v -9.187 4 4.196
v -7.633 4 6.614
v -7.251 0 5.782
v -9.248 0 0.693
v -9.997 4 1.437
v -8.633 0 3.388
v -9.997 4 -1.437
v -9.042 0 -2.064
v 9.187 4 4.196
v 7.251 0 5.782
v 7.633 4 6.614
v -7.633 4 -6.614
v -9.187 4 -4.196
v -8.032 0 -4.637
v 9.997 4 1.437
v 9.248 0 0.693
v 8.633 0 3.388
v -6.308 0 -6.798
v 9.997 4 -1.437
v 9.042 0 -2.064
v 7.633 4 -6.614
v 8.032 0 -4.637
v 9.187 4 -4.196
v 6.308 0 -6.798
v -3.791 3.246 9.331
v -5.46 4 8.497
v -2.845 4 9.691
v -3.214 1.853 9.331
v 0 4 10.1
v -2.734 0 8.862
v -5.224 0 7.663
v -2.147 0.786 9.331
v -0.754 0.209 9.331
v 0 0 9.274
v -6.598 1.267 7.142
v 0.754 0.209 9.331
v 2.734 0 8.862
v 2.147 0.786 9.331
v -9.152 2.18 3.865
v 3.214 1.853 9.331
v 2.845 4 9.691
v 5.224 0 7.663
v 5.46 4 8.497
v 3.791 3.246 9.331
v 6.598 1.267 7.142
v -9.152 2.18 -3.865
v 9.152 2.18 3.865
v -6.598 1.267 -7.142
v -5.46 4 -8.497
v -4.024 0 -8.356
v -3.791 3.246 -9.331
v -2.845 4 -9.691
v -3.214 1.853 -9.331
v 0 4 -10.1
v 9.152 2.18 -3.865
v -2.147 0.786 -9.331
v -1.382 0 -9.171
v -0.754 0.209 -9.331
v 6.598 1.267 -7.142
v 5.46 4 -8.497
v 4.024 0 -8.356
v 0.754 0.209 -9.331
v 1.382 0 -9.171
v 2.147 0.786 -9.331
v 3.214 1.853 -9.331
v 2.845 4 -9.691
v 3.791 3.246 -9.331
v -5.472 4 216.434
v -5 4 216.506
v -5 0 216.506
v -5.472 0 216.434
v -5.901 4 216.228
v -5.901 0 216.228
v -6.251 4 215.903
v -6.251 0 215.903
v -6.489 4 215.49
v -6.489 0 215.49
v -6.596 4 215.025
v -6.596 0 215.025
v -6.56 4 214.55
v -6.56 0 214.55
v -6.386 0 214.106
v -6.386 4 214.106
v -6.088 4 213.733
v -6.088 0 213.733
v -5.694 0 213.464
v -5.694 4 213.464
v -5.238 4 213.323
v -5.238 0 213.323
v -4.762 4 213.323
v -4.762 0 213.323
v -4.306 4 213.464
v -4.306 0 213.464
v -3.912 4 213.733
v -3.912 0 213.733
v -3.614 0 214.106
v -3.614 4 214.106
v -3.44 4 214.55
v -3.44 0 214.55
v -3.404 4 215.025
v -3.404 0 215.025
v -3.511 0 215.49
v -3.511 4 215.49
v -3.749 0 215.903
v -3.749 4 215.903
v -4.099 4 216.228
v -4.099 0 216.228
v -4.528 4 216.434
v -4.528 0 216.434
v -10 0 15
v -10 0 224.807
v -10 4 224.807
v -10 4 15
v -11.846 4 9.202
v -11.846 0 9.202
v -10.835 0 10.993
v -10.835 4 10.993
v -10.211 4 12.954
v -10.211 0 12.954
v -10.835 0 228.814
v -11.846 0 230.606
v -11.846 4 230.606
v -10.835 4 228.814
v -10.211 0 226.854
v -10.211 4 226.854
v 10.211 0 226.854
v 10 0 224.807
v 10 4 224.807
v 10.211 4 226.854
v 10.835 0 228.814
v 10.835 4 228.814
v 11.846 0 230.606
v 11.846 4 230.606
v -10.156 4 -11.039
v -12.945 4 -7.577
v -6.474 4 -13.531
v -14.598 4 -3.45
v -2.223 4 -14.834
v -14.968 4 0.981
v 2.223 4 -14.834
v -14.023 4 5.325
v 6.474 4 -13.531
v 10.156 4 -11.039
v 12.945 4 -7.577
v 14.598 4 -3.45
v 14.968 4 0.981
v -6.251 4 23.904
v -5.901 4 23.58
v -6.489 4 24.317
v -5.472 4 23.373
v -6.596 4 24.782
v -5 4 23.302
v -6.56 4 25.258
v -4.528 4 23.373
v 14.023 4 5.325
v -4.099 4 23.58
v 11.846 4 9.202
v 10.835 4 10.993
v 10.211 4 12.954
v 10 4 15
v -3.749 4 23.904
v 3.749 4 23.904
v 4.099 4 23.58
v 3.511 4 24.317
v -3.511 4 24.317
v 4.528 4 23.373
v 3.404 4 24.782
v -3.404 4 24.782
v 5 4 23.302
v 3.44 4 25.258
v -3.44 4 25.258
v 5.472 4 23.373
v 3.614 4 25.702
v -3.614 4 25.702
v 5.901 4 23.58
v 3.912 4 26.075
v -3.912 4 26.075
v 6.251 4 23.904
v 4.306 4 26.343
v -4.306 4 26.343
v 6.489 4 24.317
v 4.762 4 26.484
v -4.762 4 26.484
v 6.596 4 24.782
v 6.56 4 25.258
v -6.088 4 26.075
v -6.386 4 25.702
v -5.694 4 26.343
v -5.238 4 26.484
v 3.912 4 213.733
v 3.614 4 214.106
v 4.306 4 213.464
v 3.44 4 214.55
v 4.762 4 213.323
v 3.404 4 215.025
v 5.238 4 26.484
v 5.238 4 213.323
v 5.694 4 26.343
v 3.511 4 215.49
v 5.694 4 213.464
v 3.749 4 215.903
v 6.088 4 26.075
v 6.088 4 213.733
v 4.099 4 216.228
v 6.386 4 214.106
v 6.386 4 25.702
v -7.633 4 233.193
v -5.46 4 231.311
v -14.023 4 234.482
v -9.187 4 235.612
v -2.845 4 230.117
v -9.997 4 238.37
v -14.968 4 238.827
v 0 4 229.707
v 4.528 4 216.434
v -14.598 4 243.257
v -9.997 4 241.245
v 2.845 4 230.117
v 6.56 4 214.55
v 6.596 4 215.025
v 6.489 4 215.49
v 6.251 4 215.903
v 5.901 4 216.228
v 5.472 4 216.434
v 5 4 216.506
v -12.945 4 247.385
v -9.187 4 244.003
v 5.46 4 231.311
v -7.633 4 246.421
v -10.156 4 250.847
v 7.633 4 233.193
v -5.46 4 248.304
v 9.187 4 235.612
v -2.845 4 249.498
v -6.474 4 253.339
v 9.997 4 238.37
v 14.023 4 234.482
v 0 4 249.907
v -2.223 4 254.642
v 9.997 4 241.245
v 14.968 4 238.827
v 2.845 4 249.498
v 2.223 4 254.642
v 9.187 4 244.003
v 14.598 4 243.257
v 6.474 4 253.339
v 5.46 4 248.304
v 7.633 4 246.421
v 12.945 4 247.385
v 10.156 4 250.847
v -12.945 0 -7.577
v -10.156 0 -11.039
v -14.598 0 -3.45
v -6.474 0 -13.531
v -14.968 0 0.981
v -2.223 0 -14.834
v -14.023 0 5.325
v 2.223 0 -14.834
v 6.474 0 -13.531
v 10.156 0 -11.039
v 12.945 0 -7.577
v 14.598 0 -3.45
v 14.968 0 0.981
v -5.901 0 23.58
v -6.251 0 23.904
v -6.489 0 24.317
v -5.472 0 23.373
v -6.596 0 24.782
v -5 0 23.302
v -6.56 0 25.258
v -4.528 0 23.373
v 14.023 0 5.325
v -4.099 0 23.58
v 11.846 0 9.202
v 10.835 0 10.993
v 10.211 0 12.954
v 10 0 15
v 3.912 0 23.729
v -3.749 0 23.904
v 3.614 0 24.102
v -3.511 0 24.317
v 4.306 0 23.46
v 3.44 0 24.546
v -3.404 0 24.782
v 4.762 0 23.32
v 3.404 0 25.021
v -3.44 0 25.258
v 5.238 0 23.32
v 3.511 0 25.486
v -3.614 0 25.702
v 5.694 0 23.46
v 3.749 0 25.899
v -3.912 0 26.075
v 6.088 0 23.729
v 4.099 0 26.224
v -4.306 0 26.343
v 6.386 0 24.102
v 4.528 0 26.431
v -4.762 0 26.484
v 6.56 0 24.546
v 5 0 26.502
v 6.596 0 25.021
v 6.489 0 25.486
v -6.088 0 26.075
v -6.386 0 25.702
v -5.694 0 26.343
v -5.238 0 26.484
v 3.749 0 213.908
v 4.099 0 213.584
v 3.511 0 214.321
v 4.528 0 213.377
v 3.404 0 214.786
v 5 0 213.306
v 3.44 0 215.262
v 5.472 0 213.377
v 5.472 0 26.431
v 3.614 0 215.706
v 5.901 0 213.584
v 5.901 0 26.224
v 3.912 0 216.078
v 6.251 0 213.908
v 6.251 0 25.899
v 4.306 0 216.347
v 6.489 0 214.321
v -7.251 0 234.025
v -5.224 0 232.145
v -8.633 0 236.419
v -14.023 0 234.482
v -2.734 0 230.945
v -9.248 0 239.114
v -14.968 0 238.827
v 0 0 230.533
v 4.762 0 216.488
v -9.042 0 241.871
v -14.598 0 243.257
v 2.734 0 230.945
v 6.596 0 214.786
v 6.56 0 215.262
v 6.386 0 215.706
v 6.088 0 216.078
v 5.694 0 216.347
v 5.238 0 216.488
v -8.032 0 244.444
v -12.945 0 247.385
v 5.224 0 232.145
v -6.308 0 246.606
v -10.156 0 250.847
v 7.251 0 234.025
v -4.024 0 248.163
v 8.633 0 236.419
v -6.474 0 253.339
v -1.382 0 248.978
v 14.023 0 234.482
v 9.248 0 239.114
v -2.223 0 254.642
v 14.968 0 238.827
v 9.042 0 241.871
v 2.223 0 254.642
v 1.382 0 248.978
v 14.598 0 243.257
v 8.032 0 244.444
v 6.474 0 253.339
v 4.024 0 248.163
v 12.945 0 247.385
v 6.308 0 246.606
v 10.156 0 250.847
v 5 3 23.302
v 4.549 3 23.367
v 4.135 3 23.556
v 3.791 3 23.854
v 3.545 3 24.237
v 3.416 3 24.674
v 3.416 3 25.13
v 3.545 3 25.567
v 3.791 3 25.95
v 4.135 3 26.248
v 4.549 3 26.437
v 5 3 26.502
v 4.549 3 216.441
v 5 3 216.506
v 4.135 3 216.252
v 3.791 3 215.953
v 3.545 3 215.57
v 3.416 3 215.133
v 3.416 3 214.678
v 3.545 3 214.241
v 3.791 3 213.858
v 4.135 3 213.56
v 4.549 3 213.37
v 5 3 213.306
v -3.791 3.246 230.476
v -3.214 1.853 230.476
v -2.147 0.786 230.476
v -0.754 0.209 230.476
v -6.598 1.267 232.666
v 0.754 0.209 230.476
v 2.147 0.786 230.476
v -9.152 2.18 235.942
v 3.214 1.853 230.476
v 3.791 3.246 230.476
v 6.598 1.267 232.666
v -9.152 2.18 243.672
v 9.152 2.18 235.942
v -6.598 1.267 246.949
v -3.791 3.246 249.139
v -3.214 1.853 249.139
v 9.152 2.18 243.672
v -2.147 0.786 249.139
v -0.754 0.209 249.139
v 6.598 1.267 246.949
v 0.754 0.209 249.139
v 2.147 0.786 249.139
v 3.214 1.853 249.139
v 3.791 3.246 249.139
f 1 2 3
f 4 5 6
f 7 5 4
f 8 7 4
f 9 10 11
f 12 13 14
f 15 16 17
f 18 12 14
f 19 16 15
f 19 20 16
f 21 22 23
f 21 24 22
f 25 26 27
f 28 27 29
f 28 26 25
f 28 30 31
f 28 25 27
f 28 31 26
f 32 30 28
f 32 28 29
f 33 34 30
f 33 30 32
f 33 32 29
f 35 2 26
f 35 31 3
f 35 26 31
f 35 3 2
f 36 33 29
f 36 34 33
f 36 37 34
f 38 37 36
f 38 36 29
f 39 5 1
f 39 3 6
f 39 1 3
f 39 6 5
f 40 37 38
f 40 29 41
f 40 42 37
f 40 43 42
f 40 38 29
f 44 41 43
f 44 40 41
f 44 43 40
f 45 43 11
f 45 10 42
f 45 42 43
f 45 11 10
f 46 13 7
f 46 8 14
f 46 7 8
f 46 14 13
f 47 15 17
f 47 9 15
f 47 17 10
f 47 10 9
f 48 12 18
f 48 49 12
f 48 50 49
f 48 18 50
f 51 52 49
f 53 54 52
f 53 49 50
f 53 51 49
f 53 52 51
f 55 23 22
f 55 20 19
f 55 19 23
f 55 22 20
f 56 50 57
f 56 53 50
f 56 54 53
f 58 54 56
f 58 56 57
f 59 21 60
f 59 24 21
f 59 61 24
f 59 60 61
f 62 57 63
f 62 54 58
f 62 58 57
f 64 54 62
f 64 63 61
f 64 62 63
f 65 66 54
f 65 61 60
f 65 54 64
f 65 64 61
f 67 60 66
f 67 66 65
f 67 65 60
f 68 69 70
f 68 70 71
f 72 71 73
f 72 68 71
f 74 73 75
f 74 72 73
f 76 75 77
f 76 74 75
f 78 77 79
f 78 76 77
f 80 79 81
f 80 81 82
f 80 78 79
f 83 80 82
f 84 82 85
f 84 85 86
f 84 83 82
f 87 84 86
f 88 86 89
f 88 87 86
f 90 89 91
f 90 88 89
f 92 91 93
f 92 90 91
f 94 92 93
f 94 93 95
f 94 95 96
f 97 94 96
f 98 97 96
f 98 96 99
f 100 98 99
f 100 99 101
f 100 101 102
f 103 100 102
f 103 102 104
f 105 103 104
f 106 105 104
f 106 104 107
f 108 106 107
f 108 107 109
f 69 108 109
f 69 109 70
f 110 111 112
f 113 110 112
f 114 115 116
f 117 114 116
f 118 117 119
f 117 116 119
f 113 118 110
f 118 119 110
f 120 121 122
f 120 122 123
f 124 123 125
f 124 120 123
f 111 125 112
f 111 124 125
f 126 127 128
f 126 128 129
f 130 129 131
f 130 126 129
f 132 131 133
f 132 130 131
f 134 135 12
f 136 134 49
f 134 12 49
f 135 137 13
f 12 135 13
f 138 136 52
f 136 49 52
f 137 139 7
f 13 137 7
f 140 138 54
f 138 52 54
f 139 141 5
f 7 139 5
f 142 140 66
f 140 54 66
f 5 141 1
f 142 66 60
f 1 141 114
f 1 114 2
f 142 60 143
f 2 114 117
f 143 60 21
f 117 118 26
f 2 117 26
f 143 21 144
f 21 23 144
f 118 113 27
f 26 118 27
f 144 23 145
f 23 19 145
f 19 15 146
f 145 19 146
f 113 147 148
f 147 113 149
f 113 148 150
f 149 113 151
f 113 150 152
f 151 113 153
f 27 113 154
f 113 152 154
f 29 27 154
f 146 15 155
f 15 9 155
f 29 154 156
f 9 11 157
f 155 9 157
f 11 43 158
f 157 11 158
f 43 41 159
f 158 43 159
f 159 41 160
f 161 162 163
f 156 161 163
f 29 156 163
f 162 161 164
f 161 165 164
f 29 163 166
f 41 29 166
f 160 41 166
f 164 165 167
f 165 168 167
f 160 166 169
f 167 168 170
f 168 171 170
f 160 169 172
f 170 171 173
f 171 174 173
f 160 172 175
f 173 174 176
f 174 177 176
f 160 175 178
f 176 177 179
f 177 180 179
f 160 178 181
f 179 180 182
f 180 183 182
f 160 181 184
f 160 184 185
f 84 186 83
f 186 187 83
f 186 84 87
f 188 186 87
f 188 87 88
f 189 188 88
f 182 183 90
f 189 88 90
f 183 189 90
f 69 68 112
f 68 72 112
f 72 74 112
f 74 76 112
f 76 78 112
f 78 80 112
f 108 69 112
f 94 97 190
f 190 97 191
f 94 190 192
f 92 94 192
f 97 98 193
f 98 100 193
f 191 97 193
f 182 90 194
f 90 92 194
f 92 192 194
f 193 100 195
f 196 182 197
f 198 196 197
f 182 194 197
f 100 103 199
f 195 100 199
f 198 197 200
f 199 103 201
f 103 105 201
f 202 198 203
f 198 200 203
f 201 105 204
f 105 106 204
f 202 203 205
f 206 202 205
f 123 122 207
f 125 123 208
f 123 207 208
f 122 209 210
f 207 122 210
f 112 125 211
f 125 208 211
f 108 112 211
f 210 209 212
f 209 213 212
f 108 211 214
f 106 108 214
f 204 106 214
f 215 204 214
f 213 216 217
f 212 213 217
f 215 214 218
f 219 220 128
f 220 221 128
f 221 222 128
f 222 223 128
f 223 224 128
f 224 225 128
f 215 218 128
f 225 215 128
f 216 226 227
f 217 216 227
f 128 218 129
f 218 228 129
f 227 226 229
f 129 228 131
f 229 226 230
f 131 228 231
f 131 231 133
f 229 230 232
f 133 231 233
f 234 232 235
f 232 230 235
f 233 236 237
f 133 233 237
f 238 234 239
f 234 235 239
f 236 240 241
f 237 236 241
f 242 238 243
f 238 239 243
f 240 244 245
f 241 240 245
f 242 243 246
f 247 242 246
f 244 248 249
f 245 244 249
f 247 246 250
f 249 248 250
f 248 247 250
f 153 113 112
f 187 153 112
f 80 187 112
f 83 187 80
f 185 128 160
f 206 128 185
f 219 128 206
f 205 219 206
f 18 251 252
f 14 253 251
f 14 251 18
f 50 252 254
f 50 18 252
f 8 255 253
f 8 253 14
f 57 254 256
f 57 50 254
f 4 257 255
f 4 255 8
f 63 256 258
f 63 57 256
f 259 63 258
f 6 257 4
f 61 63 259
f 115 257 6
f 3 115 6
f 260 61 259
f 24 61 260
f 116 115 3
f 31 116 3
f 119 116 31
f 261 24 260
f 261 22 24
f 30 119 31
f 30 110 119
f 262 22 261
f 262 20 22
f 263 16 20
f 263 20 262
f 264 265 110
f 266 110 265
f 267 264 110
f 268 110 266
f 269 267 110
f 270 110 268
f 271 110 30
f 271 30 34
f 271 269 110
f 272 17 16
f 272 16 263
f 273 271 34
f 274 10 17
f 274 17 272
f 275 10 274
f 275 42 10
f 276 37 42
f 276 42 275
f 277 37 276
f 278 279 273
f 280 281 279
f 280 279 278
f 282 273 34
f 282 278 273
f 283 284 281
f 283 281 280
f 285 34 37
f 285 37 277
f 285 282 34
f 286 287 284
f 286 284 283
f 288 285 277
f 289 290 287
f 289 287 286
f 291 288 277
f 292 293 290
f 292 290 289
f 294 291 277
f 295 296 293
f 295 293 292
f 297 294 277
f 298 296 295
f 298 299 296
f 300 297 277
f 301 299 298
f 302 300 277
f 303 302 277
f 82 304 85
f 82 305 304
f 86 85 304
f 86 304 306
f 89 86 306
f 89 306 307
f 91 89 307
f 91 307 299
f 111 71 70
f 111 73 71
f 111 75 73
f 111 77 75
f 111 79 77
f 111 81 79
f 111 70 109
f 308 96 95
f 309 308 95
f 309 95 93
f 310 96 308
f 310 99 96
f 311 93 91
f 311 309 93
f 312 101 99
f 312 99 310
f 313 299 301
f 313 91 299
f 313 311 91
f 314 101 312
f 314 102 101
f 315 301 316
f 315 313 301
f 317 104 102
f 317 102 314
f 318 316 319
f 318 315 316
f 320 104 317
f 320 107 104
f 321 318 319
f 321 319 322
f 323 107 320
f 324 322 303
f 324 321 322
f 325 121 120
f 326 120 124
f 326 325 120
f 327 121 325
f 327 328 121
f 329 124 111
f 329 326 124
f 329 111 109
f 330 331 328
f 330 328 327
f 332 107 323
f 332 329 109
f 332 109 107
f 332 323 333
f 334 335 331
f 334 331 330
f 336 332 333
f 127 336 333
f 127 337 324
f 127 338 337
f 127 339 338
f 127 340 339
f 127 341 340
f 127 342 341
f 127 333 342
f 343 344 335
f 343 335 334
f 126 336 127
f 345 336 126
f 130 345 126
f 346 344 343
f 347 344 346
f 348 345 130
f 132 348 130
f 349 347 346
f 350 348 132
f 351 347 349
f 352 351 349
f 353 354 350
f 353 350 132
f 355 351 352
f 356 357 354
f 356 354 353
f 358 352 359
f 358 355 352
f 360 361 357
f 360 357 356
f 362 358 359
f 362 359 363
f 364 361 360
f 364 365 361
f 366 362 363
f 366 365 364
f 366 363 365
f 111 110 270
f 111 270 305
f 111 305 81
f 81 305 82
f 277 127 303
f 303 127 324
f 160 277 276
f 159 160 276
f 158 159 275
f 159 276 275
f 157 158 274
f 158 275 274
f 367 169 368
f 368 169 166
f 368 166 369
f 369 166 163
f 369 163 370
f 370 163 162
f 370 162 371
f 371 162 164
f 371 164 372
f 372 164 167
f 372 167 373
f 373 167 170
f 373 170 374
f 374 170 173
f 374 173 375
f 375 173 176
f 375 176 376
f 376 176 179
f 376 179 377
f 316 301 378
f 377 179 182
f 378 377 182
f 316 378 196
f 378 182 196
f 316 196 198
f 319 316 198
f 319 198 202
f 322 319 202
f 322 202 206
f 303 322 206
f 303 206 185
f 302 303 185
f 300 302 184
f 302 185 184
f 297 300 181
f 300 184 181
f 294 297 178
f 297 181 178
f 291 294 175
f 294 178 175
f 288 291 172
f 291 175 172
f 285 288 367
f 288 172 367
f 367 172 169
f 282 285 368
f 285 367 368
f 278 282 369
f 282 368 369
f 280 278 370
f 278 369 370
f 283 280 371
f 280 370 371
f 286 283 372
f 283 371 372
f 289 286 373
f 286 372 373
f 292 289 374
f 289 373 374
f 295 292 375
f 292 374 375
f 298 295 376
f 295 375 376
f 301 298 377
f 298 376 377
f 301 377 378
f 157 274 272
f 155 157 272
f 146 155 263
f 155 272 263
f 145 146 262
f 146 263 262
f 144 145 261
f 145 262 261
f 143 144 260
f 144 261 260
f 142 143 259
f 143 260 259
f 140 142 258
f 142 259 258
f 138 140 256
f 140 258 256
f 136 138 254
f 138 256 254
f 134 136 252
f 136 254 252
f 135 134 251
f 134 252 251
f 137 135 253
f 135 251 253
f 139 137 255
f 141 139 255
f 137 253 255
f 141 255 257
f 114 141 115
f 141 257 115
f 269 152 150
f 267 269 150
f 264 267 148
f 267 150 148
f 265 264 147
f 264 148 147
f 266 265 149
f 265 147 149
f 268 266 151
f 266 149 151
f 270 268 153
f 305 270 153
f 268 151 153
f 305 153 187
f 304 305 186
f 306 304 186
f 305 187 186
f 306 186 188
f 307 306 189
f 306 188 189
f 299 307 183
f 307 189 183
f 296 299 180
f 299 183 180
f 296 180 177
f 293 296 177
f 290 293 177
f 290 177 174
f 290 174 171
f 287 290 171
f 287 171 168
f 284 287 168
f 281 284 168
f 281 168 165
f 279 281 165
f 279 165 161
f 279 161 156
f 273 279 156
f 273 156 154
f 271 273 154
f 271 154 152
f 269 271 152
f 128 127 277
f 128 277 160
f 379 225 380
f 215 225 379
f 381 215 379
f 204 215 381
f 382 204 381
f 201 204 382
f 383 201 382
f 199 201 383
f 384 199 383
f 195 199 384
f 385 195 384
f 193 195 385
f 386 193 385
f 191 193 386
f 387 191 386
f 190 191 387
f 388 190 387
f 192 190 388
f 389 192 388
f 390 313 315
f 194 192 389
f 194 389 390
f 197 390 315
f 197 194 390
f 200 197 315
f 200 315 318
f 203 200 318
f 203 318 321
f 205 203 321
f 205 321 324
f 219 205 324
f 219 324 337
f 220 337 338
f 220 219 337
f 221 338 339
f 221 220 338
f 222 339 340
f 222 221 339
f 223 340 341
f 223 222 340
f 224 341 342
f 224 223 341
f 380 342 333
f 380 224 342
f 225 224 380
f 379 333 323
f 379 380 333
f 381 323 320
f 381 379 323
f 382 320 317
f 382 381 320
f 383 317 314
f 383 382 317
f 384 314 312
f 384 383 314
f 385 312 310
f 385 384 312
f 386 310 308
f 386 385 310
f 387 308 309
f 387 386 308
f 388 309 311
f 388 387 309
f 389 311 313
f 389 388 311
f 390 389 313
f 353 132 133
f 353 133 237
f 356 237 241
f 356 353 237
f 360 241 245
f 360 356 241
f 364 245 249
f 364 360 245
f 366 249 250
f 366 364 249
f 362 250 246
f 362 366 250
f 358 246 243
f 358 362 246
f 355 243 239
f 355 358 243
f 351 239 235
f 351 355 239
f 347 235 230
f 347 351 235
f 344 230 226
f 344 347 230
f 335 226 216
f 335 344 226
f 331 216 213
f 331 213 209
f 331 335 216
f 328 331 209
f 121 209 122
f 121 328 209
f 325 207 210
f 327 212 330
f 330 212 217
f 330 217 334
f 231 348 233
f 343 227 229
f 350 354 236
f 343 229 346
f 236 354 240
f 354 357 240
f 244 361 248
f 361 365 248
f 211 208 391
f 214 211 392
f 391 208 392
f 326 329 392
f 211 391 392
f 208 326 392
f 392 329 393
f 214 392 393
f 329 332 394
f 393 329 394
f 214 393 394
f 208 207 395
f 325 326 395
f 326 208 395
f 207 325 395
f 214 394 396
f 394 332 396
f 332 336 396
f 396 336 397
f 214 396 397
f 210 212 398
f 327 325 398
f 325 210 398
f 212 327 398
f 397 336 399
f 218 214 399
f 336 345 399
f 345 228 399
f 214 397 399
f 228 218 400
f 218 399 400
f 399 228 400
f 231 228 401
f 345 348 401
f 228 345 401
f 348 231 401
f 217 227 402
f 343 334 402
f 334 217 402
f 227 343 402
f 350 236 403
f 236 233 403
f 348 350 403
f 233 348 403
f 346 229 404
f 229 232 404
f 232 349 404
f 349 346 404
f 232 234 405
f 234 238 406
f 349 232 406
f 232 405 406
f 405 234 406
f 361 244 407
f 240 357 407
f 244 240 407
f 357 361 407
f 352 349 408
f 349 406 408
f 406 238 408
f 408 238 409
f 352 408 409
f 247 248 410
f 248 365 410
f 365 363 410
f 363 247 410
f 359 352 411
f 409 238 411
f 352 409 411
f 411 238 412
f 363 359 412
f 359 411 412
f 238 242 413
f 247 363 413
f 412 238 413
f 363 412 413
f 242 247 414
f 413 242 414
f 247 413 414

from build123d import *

# Parameters (mm, degrees)
BOSS_EXTRUDE1_DEPTH = 4
CUT_EXTRUDE1_DEPTH  = 1
SKETCH4_R           = 1.6
CUT_EXTRUDE2_DEPTH  = 10
BOSS_EXTRUDE2_START = 1
SKETCH6_R           = 1.6
BOSS_EXTRUDE2_DEPTH = 1
SKETCH7_W           = 20
SKETCH7_H           = 4
BOSS_EXTRUDE3_DEPTH = 85.1


with BuildPart() as part:
    # Sketch1 → Boss-Extrude1 (new body)
    with BuildSketch(Plane(origin=(0, 0, 0), x_dir=(1, 0, 0), z_dir=(0, 1, 0))):
        with BuildLine():
            Line((-10, -15), (-10, -34.803693177))
            Line((-10, -34.803693177), (10, -34.803693177))
            Line((10, -34.803693177), (10, -15))
            ThreePointArc((10, -15), (10.472630633, -11.957512347), (11.845976177, -9.201785066))
            ThreePointArc((11.845976177, -9.201785066), (0, 15), (-11.845976177, -9.201785066))
            ThreePointArc((-11.845976177, -9.201785066), (-10.472630633, -11.957512347), (-10, -15))
        make_face()
    extrude(amount=BOSS_EXTRUDE1_DEPTH)

    # Sketch2 → Cut-Revolve1 (revolve, cut)
    with BuildSketch(Plane(origin=(0, 4, 0), x_dir=(1, 0, 0), z_dir=(0, 1, 0))):
        with BuildLine():
            Line((0, 10.1), (0, -10.1))
            ThreePointArc((0, -10.1), (10.1, 0), (0, 10.1))
        make_face()
    revolve(axis=Axis((0, 4, -10.1), (0, 0, 1)), mode=Mode.SUBTRACT)

    # Sketch3 → Cut-Extrude1 (cut)
    with BuildSketch(Plane(origin=(0, 4, 0), x_dir=(1, 0, 0), z_dir=(0, 1, 0))):
        with BuildLine():
            Line((10, -24.901846588), (10, -39.974302239))
            ThreePointArc((10, -39.974302239), (0, -49.974302239), (-10, -39.974302239))
            Line((-10, -39.974302239), (-10, -24.901846588))
            ThreePointArc((-10, -24.901846588), (0, -14.901846588), (10, -24.901846588))
        make_face()
    extrude(amount=-CUT_EXTRUDE1_DEPTH, mode=Mode.SUBTRACT)

    # Sketch4 → Cut-Extrude2 (cut)
    with BuildSketch(Plane(origin=(0, 3, 0), x_dir=(1, 0, 0), z_dir=(0, 1, 0))):
        with Locations(Location((5, -24.901846588, 0), (0, 0, 270))):
            Circle(SKETCH4_R)
        with Locations(Location((-5, -24.901846588, 0), (0, 0, 90))):
            Circle(SKETCH4_R)
    extrude(amount=-CUT_EXTRUDE2_DEPTH, mode=Mode.SUBTRACT)

    # Sketch6 → Boss-Extrude2 (add)
    with BuildSketch(Plane(origin=(0, 3, 0), x_dir=(1, 0, 0), z_dir=(0, 1, 0)).offset(BOSS_EXTRUDE2_START)):
        with BuildLine():
            Line((-10, -24.901846588), (-10, -34.803693177))
            Line((-10, -34.803693177), (10, -34.803693177))
            Line((10, -34.803693177), (10, -24.901846588))
            ThreePointArc((10, -24.901846588), (0, -14.901846588), (-10, -24.901846588))
        make_face()
        with Locations(Location((-5, -24.901846588, 0), (0, 0, 90))):
            Circle(SKETCH6_R, mode=Mode.SUBTRACT)
        with Locations(Location((5, -24.901846588, 0), (0, 0, 90))):
            Circle(SKETCH6_R, mode=Mode.SUBTRACT)
    extrude(amount=-BOSS_EXTRUDE2_DEPTH)

    # Sketch7 → Boss-Extrude3 (add)
    with BuildSketch(Plane.XY.offset(34.803693177)):
        with Locations((0, 2)):
            Rectangle(SKETCH7_W, SKETCH7_H)
    extrude(amount=BOSS_EXTRUDE3_DEPTH)

    # Mirror3: part across plane


with BuildPart() as part_1:
    add(part.part)
    add(part.part.mirror(Plane(origin=(0, 0, 119.903693177), x_dir=(1, 0, 0), z_dir=(0, 0, -1))))


solid = part_1.part
